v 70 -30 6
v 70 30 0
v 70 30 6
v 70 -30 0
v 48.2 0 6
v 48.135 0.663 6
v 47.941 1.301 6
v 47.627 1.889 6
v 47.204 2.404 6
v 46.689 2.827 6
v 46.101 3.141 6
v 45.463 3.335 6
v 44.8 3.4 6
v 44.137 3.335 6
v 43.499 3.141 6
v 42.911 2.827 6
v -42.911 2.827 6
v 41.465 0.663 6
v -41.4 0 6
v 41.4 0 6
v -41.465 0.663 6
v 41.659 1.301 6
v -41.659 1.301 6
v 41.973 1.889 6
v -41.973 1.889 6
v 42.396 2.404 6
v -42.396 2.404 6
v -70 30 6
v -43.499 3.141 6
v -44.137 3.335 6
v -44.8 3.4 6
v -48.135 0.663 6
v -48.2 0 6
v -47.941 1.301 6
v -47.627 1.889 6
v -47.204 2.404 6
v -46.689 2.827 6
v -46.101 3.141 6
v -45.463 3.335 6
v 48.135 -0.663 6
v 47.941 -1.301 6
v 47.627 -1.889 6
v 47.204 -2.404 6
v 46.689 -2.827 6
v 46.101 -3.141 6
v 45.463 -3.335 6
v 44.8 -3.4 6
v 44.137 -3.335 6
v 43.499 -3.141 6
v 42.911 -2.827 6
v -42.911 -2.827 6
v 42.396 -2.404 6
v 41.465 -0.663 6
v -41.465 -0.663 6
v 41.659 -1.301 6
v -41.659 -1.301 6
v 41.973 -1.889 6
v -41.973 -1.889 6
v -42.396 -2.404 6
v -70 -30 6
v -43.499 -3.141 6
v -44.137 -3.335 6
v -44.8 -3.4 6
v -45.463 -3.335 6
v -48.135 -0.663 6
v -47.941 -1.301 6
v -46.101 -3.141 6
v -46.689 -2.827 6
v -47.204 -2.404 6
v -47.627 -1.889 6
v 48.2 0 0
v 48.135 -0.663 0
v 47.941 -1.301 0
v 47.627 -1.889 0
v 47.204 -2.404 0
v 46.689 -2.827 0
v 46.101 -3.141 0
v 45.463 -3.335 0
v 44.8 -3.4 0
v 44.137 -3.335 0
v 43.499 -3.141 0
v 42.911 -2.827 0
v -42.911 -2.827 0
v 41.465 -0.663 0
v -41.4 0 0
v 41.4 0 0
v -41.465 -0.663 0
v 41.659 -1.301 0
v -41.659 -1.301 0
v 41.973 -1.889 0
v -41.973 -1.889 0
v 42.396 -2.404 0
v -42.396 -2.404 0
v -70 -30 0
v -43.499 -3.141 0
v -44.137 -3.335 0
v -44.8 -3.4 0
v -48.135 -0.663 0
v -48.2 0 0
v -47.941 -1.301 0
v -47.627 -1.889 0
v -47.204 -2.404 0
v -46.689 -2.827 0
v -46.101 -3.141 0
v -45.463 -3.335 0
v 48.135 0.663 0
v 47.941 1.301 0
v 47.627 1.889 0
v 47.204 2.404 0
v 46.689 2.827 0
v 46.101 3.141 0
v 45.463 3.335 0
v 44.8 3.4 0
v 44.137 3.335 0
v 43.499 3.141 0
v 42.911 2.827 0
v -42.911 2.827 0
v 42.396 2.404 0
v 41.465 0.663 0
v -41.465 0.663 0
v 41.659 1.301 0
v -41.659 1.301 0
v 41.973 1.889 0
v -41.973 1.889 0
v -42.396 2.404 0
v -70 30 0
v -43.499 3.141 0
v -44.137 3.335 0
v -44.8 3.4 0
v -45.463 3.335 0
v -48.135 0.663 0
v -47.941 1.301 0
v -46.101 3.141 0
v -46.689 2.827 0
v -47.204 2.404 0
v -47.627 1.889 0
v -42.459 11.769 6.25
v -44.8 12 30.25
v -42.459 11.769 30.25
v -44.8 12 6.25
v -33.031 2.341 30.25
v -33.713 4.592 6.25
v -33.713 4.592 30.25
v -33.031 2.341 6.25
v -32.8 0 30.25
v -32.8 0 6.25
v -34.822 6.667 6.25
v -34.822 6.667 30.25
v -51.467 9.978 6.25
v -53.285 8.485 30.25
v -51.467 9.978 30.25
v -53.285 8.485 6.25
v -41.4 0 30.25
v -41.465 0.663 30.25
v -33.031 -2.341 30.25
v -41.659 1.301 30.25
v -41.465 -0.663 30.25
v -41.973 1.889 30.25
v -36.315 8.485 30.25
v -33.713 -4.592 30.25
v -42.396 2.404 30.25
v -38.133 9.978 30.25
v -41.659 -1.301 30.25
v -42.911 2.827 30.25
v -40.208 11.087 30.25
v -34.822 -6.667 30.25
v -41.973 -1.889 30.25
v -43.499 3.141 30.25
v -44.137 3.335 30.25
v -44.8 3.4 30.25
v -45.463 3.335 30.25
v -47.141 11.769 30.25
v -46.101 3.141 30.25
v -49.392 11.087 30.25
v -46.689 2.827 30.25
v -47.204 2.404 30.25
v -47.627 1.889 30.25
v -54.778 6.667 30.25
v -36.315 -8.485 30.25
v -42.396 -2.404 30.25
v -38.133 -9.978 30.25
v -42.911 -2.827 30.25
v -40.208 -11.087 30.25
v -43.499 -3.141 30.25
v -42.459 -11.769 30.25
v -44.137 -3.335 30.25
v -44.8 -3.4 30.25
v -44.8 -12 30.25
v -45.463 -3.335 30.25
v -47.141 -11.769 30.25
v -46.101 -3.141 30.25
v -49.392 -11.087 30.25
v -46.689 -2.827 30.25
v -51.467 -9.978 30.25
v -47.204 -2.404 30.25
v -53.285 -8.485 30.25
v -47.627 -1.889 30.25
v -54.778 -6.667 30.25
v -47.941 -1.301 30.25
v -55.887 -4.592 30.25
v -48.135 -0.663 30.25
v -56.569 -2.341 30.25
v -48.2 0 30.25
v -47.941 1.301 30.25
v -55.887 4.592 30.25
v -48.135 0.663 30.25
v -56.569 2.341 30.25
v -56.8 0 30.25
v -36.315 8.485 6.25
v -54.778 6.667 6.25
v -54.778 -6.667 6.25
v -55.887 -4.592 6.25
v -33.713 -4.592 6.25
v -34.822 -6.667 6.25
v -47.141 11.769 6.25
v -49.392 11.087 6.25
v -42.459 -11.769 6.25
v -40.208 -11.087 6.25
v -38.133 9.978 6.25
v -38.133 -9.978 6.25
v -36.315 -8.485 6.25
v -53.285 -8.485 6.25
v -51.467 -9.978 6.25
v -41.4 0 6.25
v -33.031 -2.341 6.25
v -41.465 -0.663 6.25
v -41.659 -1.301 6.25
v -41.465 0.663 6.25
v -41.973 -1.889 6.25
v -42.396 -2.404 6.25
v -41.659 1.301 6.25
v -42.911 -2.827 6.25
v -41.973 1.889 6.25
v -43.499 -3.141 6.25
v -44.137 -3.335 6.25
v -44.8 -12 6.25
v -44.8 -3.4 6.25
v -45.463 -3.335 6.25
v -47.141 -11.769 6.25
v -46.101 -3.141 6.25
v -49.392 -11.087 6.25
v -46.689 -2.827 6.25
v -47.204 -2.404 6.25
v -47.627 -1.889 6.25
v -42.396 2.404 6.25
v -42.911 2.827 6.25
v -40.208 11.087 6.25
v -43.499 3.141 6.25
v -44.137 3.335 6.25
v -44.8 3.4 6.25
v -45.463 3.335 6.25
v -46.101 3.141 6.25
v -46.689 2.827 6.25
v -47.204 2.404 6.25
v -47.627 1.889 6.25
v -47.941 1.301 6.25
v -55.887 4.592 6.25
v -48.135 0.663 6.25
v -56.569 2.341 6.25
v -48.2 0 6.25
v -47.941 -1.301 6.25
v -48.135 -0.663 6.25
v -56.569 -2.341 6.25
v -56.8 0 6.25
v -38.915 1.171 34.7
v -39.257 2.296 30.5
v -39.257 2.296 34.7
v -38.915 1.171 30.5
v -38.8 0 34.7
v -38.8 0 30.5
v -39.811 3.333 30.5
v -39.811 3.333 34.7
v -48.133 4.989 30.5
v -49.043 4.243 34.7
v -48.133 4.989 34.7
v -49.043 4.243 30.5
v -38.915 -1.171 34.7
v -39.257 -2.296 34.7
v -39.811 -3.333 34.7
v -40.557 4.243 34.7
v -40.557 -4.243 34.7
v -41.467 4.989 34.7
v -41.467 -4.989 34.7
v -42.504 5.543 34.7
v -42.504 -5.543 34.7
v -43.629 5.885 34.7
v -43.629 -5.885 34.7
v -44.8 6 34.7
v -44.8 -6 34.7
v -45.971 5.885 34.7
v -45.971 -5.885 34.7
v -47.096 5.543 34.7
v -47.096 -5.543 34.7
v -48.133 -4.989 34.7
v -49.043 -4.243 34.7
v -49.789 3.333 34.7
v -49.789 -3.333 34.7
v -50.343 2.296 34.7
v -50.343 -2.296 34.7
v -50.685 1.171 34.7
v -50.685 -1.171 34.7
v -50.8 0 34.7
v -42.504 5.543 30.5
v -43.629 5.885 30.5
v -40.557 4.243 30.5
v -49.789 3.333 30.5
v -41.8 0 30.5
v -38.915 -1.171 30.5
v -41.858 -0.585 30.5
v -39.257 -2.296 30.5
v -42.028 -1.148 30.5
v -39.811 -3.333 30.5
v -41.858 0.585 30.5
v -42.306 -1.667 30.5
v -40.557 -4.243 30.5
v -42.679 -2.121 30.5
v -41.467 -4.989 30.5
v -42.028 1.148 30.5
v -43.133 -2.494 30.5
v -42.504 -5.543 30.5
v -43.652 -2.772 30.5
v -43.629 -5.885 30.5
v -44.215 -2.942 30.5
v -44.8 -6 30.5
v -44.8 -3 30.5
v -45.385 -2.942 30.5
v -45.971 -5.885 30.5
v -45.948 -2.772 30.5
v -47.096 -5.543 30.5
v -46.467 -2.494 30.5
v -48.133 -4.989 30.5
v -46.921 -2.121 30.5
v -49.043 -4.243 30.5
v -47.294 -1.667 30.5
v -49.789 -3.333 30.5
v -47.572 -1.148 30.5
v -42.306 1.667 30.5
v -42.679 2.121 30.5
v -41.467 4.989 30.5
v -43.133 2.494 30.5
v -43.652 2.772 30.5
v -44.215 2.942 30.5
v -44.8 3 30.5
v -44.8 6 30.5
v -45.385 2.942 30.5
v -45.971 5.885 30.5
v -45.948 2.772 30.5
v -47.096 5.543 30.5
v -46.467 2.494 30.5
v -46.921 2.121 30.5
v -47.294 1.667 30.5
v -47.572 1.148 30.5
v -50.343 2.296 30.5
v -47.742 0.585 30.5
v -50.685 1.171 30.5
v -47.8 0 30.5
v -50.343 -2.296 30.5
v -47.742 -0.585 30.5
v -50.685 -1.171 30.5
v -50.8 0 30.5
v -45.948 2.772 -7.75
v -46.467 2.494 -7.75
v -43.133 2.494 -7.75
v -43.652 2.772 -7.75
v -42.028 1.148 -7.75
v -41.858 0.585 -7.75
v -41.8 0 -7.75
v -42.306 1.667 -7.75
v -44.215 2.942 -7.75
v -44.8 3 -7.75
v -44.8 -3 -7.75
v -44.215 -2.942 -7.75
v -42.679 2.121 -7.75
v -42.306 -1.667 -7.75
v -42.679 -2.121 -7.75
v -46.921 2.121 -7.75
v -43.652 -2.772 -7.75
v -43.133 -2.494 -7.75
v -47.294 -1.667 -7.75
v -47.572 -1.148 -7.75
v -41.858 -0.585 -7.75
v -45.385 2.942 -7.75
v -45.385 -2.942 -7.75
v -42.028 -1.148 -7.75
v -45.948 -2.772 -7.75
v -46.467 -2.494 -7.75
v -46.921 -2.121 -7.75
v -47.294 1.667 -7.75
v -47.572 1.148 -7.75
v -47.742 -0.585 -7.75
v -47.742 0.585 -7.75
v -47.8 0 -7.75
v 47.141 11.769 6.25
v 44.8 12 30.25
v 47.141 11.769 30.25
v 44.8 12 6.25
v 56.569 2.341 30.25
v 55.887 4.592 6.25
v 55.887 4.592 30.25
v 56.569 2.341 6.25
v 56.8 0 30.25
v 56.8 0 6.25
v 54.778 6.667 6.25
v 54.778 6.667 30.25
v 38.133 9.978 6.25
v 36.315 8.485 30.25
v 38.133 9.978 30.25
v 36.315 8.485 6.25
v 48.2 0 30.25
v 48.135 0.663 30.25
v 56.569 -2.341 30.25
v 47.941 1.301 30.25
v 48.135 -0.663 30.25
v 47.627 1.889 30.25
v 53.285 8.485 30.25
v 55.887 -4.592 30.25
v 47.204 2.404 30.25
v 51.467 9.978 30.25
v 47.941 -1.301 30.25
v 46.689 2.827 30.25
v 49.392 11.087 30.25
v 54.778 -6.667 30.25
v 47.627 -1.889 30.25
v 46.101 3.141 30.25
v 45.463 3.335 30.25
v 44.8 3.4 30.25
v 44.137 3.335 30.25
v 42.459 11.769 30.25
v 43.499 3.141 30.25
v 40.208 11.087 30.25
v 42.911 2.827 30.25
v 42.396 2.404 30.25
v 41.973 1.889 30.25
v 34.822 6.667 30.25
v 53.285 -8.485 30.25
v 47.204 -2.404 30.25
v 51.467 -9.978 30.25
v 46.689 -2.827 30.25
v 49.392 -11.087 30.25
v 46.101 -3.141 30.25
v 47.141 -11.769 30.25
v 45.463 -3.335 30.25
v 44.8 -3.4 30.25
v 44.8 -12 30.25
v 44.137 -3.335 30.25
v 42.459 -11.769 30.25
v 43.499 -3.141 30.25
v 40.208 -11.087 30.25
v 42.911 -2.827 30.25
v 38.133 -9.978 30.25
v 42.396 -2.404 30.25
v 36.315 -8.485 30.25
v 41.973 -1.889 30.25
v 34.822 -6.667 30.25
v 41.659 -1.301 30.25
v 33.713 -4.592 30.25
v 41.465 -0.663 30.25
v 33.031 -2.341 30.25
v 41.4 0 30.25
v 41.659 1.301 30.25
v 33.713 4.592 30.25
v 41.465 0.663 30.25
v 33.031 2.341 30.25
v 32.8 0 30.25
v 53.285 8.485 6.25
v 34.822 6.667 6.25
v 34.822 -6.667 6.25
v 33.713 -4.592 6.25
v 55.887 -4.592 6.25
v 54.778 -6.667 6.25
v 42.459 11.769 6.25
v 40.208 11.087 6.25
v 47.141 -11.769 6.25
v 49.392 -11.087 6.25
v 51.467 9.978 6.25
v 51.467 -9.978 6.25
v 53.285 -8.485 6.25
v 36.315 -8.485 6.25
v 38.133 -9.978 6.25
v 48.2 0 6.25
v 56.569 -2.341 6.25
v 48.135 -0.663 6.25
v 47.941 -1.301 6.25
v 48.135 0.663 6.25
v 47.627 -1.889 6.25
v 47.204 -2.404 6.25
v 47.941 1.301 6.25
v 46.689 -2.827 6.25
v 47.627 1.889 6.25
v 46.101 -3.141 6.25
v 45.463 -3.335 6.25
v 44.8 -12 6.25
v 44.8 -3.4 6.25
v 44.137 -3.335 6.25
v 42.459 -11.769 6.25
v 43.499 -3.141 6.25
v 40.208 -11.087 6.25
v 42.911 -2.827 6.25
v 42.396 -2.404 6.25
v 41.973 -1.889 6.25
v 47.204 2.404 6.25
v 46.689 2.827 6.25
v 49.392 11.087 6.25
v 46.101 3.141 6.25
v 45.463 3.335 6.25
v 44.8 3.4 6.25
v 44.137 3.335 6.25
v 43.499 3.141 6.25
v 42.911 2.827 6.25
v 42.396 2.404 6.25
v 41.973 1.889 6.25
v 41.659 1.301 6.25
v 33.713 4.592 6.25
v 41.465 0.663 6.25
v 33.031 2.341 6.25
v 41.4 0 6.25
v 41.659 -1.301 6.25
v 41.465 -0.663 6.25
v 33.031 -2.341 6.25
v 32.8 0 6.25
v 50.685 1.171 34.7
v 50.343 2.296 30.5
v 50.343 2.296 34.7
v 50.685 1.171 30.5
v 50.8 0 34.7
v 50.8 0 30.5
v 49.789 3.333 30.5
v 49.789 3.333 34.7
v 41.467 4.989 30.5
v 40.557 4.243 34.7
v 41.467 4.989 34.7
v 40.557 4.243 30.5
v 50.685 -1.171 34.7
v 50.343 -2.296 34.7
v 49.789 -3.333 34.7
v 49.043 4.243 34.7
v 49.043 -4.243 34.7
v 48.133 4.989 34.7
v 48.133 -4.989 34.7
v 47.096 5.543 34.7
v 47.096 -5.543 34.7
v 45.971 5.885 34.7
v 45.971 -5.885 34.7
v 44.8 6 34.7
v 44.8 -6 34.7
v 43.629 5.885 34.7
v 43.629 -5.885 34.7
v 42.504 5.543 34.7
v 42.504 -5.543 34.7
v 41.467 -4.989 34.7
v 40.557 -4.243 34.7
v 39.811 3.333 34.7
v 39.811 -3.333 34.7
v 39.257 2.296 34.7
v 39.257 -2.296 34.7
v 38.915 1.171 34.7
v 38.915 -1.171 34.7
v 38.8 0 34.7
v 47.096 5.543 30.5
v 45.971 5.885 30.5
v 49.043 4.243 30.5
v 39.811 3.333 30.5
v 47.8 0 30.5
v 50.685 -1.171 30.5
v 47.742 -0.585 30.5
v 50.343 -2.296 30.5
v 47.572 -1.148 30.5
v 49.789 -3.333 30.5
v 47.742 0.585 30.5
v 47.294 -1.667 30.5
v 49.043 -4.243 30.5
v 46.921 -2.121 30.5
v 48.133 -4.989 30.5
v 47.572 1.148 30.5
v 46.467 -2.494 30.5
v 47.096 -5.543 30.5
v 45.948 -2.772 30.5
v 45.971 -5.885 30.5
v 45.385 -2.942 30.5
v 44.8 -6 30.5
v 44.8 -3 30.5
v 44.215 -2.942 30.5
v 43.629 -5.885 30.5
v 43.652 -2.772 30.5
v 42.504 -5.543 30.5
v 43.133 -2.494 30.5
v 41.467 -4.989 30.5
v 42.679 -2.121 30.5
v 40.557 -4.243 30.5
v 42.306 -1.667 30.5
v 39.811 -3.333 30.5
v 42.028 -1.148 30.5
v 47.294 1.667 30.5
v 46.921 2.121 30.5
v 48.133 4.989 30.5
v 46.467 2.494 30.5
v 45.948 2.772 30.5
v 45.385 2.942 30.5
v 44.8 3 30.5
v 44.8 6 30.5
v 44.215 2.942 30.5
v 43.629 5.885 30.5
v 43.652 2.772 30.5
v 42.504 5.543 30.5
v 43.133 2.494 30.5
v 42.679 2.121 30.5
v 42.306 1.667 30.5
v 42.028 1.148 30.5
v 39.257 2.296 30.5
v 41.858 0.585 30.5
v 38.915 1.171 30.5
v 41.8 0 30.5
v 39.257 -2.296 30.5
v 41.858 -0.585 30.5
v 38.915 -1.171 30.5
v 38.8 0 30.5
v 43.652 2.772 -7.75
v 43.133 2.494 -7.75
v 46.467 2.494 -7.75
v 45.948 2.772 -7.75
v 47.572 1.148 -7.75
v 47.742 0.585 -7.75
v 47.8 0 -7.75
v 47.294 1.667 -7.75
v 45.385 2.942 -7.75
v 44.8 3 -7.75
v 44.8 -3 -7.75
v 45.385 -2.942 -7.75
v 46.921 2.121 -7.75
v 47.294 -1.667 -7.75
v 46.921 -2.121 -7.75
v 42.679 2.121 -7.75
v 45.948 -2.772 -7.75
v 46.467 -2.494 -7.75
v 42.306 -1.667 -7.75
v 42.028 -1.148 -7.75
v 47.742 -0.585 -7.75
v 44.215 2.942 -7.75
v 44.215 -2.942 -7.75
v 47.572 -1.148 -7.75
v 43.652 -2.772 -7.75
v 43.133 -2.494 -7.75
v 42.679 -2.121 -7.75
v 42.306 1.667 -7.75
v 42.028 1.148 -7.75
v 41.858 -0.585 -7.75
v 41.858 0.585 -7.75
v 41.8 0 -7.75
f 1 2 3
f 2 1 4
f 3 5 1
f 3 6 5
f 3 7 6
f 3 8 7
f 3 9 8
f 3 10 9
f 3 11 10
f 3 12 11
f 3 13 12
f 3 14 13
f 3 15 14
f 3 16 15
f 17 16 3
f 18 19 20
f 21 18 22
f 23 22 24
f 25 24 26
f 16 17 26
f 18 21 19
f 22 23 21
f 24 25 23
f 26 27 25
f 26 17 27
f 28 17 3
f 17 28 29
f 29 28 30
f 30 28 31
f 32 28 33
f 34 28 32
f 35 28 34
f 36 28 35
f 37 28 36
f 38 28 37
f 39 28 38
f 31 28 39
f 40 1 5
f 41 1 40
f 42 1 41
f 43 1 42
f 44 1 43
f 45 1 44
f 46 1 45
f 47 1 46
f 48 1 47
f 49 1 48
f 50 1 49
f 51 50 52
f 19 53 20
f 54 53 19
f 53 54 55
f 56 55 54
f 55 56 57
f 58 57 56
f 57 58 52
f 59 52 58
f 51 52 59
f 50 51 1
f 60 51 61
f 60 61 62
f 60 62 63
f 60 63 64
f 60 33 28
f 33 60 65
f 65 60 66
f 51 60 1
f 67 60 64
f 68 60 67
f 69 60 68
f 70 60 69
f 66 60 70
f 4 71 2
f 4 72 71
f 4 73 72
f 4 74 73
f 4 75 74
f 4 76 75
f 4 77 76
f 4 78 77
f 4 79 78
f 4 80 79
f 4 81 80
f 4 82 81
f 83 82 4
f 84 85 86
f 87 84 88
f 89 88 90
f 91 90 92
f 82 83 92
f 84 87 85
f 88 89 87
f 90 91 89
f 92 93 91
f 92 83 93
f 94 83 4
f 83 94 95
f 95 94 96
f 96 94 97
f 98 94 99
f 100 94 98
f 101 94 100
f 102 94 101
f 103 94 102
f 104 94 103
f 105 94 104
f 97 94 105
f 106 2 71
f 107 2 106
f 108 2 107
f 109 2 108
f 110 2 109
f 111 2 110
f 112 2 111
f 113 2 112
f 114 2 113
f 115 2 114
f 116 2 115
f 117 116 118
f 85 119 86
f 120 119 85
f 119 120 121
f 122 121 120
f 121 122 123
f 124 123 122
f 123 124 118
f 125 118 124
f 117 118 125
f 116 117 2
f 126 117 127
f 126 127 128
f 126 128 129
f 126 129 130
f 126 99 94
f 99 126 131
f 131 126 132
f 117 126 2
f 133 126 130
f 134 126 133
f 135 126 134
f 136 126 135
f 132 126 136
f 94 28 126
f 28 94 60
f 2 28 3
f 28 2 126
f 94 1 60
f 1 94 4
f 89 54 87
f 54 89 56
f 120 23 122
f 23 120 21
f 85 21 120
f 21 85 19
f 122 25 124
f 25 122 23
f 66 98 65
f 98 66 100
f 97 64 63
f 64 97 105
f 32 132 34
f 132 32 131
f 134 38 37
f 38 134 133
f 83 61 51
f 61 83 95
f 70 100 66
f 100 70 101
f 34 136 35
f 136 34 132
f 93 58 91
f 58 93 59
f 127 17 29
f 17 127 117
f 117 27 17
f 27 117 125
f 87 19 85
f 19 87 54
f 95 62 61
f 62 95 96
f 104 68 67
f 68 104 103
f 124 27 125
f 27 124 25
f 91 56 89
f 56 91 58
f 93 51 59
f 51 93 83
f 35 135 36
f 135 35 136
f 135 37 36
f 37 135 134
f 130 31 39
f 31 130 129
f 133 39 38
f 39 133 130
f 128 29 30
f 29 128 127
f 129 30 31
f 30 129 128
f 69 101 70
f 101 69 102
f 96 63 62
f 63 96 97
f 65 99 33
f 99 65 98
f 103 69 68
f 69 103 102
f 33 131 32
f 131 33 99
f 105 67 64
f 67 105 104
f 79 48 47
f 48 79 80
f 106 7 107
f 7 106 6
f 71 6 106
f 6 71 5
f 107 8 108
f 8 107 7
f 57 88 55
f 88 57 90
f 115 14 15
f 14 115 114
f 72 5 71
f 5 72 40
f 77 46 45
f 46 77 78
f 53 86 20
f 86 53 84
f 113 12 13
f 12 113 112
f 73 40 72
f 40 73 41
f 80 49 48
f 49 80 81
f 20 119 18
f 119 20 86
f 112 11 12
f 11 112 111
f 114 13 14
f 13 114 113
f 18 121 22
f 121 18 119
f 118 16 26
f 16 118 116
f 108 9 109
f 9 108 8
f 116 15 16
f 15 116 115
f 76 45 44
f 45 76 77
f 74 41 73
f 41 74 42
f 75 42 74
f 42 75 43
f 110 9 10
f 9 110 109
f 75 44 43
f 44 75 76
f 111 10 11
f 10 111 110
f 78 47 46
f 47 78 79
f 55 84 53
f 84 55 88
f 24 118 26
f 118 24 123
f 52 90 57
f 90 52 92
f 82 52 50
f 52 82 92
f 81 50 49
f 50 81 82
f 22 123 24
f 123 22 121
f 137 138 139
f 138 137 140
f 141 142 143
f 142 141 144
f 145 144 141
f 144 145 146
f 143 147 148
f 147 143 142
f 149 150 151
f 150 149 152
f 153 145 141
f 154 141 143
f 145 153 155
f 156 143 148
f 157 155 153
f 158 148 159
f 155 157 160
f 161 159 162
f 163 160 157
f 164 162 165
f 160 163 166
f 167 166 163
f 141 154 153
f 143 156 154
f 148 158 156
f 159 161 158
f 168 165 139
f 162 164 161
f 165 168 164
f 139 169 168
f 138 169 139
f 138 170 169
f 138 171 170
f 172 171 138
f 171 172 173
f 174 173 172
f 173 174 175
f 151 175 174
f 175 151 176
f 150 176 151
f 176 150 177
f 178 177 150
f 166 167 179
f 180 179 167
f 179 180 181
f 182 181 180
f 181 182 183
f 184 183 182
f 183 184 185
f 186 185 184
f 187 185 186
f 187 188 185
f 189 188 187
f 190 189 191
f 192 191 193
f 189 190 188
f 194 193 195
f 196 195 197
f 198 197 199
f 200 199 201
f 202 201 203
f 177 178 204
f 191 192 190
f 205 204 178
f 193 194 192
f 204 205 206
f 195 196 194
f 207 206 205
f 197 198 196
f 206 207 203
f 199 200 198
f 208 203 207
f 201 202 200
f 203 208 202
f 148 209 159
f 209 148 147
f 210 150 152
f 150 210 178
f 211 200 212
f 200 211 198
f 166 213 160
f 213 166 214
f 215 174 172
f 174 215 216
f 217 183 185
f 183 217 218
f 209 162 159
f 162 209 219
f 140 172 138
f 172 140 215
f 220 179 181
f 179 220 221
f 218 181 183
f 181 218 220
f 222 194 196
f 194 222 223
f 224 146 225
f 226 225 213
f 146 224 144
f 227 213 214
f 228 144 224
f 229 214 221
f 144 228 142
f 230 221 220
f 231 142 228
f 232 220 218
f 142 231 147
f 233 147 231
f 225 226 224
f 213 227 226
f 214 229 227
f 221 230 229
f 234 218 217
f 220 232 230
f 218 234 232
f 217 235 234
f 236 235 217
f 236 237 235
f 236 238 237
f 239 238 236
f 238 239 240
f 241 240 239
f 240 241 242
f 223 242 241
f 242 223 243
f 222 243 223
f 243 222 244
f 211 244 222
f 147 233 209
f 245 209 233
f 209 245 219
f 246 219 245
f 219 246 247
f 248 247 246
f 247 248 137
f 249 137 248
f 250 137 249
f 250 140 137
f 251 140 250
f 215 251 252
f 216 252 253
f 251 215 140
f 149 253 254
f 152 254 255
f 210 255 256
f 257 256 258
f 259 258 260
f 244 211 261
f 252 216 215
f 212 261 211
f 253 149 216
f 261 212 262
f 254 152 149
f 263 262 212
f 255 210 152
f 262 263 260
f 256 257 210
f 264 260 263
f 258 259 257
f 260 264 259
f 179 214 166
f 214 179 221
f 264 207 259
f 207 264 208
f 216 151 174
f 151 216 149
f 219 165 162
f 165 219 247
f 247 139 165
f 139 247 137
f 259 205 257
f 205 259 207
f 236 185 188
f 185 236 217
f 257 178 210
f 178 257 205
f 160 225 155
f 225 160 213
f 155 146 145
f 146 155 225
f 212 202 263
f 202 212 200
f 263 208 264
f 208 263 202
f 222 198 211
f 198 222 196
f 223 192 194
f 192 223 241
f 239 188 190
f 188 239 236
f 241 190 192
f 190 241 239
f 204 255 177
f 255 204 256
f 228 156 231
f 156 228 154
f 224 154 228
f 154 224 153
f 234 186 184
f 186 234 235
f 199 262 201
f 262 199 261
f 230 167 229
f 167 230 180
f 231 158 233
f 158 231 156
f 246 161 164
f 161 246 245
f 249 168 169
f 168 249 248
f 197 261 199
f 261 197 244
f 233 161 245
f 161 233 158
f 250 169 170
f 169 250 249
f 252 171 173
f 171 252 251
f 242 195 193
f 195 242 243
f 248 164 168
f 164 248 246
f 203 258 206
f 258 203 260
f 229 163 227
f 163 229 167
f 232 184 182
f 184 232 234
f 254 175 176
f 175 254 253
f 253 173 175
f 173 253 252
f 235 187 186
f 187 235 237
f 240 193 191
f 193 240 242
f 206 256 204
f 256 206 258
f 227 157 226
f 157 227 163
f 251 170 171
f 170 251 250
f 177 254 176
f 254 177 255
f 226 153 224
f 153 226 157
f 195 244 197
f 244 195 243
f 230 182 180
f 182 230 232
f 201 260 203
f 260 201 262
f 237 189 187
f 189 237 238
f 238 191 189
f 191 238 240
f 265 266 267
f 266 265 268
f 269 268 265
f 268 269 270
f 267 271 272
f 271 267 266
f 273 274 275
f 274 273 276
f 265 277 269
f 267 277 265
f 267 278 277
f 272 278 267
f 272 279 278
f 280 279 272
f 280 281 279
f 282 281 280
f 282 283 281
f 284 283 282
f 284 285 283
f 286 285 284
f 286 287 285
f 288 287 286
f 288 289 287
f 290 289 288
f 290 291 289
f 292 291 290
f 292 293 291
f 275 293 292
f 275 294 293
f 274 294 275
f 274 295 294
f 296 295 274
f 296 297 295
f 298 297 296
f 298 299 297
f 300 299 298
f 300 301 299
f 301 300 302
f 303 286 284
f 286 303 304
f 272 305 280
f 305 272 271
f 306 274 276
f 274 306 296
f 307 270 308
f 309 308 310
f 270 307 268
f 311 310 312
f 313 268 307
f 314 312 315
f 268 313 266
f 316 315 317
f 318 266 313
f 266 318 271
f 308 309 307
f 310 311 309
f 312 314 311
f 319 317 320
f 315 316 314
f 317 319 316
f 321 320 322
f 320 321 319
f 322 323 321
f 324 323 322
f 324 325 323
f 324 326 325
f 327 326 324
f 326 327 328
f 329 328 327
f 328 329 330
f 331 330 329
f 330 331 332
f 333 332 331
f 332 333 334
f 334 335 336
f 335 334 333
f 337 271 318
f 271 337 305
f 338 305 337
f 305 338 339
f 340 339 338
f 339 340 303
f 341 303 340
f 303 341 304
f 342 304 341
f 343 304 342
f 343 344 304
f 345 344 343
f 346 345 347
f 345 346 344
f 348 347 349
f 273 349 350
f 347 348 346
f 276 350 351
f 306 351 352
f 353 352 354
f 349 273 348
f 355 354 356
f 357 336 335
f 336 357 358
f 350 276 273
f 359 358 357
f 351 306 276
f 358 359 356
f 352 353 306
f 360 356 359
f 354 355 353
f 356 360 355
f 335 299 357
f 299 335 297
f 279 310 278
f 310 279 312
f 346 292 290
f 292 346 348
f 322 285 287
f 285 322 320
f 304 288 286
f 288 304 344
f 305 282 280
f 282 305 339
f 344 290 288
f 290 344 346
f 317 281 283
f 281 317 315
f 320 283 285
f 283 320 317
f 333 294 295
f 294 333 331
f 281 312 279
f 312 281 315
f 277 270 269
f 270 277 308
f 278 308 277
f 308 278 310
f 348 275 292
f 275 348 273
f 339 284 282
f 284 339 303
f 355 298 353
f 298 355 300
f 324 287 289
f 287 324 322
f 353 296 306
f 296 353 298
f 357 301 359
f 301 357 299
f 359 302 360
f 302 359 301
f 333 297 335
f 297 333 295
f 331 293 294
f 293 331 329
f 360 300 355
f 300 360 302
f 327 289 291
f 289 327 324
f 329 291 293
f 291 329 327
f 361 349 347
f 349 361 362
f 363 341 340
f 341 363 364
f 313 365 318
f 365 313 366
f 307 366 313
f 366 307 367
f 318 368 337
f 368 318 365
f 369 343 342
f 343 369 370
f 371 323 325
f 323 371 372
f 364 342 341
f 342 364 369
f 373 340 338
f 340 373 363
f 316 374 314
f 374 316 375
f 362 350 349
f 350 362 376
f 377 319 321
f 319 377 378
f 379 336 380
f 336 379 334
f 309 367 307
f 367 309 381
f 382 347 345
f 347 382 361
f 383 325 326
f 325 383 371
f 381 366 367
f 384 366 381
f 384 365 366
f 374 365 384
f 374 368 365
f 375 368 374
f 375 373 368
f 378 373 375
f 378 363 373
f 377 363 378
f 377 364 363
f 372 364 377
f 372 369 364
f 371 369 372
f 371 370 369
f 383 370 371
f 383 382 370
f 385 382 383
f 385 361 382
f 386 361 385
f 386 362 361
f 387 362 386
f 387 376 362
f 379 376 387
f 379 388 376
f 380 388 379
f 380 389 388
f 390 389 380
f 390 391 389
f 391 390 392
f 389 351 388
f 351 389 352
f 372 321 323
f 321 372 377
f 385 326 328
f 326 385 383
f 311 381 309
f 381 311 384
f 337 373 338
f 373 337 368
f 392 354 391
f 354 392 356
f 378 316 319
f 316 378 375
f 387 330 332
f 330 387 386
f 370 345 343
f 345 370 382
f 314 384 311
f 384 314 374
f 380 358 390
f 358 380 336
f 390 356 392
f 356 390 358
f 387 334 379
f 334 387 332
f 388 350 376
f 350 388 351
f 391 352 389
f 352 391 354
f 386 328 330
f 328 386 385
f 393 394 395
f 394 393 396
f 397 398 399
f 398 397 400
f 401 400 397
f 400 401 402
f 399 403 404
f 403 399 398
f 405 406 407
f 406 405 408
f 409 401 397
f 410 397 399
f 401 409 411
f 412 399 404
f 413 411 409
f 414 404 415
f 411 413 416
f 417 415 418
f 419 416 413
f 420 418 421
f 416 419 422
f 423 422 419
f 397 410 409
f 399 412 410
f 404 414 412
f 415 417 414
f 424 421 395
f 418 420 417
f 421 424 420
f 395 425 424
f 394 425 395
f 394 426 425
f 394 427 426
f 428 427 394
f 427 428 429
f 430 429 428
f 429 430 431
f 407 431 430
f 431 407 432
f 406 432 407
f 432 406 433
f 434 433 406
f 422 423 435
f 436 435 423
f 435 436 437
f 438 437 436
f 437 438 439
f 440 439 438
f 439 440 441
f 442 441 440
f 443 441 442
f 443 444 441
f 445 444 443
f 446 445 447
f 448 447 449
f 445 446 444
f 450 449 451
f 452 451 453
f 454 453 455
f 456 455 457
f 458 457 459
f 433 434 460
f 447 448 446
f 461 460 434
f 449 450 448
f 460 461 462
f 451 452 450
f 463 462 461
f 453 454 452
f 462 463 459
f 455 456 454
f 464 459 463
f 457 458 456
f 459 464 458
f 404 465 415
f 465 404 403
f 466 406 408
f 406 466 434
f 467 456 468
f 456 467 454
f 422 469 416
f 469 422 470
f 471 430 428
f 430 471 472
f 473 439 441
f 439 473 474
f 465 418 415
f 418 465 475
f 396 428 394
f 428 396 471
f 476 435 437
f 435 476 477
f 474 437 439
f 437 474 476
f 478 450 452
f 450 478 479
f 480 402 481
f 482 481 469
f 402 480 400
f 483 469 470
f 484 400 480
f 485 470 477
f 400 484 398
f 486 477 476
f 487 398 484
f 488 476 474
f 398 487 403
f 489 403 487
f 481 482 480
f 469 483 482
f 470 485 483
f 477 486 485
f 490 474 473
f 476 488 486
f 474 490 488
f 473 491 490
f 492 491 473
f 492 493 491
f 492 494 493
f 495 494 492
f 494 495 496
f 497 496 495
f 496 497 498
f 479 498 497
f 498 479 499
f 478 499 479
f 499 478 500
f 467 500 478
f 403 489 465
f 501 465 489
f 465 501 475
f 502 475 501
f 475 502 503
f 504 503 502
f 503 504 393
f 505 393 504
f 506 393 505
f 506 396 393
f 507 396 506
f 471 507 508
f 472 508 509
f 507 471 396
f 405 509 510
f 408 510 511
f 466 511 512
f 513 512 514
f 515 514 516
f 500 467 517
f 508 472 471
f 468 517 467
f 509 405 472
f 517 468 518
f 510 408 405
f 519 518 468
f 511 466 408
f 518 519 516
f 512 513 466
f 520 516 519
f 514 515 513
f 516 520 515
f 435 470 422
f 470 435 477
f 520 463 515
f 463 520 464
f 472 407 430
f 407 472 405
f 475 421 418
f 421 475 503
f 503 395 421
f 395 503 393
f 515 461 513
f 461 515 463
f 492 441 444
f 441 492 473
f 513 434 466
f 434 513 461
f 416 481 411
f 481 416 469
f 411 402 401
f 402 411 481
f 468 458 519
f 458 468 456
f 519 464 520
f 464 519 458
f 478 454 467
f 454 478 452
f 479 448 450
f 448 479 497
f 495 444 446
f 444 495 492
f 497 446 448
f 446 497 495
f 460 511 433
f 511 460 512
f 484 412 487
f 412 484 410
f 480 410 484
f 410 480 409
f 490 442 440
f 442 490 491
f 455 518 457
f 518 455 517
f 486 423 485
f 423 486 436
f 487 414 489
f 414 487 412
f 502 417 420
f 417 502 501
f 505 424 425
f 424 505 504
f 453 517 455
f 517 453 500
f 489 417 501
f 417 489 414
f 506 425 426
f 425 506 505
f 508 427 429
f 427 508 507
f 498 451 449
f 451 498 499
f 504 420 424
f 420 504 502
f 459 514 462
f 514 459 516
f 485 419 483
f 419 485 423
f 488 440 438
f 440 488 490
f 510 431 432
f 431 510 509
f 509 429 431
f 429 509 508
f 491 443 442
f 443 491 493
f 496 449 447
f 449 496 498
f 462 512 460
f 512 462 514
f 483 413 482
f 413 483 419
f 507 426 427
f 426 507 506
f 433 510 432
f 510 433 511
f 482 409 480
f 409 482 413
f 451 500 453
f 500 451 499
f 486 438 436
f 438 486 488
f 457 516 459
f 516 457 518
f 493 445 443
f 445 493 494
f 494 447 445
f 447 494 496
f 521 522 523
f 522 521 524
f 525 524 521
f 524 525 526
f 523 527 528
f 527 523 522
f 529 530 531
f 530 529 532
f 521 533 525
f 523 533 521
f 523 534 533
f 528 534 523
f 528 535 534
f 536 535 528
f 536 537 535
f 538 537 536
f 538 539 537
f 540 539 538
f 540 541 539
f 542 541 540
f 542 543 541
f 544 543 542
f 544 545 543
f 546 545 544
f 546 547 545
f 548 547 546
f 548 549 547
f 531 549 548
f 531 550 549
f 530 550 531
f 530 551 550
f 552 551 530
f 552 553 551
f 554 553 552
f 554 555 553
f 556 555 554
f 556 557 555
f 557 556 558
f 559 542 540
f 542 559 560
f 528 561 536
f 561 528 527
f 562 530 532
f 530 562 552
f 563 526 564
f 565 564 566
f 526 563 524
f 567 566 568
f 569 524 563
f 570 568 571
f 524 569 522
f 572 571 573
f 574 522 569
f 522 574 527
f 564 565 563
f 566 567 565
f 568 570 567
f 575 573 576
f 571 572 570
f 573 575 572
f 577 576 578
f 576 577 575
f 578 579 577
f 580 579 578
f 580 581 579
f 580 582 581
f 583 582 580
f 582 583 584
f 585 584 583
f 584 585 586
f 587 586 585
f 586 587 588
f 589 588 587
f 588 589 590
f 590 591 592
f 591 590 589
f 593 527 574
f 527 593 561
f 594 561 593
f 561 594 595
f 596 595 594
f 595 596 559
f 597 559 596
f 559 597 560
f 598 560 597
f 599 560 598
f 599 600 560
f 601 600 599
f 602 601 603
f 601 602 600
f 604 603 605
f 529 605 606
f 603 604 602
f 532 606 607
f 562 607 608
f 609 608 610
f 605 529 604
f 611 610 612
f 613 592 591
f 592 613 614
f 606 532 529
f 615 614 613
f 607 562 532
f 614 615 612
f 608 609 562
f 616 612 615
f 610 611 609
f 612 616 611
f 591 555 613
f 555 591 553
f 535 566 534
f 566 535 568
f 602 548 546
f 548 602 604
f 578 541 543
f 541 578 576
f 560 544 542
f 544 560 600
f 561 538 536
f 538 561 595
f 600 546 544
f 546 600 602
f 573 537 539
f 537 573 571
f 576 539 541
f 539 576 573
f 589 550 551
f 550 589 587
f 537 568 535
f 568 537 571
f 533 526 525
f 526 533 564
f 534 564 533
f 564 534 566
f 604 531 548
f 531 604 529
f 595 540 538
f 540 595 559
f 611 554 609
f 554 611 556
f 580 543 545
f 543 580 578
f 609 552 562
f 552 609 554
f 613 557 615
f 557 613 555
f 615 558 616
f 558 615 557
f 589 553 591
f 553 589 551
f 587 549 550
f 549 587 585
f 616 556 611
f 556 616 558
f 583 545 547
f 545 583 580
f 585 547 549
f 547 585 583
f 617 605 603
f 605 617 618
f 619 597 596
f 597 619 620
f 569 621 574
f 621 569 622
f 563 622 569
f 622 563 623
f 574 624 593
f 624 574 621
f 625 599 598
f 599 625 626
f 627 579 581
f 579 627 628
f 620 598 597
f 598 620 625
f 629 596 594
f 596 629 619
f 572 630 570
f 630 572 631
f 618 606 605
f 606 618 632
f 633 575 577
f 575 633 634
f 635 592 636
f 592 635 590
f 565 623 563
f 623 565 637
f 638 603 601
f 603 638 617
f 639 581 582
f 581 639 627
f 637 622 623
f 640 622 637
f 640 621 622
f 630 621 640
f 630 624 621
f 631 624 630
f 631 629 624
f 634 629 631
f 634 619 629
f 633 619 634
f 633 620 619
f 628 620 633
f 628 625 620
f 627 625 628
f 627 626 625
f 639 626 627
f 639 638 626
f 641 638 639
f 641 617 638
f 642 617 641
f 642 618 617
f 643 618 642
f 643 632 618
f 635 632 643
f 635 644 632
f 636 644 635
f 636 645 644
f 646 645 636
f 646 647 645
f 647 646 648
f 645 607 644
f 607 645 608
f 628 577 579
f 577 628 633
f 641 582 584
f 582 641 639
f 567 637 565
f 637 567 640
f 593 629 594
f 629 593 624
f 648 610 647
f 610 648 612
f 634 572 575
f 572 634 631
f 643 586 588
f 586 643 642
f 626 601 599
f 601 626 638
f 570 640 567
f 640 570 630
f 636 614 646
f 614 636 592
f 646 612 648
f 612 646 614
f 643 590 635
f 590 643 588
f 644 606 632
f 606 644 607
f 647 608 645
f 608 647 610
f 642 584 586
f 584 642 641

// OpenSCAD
$fn = 32;

// ------------------------------------------------------------------------
// Standoff columns: 2 d24 standoffs, bolts d6
// Every part is its own module, assembly() places them once.
// ------------------------------------------------------------------------

// --- part 1 ---
module base_plate() {
  difference() {
    translate([-70, -30, 0]) cube([140, 60, 6]);
    translate([-44.8, 0, -1]) cylinder(h = 8, d = 6.8);
    translate([44.8, 0, -1]) cylinder(h = 8, d = 6.8);
  }
}

// --- part 2 ---
module spacer1() {
  difference() {
      translate([0, 0, 0]) cylinder(h = 24, d = 24);
      translate([0, 0, -1]) cylinder(h = 26, d = 6.8);
    }
}

// --- part 3 ---
module bolt1() {
  cylinder(h = 4.2, d = 12);
  translate([0, 0, -38.25]) cylinder(h = 38.25, d = 6);
}

// --- part 4 ---
module spacer2() {
  difference() {
      translate([0, 0, 0]) cylinder(h = 24, d = 24);
      translate([0, 0, -1]) cylinder(h = 26, d = 6.8);
    }
}

// --- part 5 ---
module bolt2() {
  cylinder(h = 4.2, d = 12);
  translate([0, 0, -38.25]) cylinder(h = 38.25, d = 6);
}

// --- assembly ---
module assembly() {
  translate([0, 0, 0]) rotate([0, 0, 0]) base_plate();
  translate([-44.8, 0, 6.25]) rotate([0, 0, 0]) spacer1();
  translate([-44.8, 0, 30.5]) rotate([0, 0, 0]) bolt1();
  translate([44.8, 0, 6.25]) rotate([0, 0, 0]) spacer2();
  translate([44.8, 0, 30.5]) rotate([0, 0, 0]) bolt2();
}

assembly();
